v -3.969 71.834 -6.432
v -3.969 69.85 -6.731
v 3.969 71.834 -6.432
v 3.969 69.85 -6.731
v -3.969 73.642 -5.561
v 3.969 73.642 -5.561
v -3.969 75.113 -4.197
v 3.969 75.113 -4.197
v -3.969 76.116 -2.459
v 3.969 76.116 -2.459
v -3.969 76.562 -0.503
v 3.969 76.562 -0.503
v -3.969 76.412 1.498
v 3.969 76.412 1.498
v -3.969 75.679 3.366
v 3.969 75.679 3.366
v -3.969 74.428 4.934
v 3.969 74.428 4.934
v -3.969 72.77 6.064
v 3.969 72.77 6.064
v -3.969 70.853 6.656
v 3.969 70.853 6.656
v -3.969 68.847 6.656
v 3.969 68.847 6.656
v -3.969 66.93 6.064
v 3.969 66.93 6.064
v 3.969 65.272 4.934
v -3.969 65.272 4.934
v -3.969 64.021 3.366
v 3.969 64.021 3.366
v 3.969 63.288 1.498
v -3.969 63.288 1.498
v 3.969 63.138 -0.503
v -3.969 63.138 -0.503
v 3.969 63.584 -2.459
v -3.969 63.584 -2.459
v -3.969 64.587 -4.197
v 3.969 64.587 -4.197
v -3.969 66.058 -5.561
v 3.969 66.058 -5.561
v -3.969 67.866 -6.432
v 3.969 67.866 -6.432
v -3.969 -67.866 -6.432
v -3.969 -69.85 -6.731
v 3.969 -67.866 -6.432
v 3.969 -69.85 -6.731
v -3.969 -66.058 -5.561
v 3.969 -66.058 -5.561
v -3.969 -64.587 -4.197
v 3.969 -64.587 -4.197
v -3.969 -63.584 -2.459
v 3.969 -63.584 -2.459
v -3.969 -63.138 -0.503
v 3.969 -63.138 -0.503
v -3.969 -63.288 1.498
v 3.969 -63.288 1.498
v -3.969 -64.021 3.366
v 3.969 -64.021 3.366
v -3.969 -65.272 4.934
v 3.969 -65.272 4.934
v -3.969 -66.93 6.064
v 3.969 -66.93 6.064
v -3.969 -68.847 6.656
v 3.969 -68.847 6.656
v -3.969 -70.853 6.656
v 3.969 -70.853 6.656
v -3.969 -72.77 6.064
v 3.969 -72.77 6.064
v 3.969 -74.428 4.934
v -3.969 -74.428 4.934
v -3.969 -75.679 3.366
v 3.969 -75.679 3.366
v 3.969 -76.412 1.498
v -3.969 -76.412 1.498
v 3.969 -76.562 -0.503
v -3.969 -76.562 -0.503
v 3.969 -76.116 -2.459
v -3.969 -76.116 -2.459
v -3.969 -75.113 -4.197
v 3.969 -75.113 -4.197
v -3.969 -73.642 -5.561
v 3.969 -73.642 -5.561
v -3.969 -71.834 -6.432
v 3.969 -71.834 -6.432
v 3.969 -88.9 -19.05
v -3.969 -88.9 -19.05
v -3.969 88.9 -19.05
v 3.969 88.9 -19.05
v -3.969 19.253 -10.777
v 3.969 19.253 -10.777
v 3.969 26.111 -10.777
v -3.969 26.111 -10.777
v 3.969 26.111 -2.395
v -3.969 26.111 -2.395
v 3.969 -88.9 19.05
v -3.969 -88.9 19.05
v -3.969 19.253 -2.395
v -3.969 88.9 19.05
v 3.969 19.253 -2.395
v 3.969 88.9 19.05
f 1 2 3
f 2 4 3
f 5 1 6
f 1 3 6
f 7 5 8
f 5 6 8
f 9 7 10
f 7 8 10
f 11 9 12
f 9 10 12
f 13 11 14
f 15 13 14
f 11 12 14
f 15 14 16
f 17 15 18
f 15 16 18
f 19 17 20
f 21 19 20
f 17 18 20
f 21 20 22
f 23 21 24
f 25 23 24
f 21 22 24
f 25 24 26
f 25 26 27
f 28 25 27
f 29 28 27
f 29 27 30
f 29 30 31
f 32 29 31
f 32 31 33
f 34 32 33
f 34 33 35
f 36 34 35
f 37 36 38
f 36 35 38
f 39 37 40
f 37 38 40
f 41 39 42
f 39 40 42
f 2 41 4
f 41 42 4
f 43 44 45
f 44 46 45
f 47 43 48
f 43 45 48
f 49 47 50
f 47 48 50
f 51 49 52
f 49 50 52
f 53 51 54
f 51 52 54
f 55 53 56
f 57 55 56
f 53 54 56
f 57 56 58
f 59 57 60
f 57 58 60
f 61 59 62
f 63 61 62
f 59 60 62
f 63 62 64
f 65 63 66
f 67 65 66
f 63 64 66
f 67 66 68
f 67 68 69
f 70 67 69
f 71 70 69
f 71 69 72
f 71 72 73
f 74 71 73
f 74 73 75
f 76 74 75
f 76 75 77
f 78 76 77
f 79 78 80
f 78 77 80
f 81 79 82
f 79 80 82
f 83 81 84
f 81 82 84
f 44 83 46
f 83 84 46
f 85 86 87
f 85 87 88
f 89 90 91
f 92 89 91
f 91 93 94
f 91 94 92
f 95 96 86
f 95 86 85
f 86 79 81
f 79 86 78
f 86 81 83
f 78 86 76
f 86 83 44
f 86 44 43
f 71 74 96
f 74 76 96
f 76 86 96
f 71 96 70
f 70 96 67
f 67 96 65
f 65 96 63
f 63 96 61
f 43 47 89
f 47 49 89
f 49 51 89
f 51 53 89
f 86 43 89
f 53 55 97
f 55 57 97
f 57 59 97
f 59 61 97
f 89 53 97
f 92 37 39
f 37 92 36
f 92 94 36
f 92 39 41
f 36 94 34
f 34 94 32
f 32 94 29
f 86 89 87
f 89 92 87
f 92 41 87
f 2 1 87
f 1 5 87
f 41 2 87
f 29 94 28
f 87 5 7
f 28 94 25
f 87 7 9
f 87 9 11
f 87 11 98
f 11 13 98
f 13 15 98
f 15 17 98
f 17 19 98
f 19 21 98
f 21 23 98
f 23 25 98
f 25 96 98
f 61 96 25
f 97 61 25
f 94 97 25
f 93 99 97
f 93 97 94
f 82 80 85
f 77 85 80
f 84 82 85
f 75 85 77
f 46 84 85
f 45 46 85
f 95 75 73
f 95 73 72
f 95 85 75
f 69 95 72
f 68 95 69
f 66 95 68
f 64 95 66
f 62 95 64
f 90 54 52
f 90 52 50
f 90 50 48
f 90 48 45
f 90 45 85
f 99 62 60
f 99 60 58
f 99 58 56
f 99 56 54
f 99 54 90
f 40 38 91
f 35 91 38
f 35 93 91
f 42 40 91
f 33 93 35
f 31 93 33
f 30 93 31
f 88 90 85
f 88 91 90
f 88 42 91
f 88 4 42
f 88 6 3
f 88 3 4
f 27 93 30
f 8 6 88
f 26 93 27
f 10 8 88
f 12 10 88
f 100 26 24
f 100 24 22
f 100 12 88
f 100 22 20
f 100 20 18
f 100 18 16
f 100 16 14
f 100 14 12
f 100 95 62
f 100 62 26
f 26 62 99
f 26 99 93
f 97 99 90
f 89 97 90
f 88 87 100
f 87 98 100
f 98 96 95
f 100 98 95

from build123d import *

# Parameters (mm, degrees)
SKETCH1_W               = 7.9375
SKETCH1_H               = 177.8
EXTRUDE_THIN1_DEPTH     = 19.05
SKETCH2_R               = 6.731
CUT_EXTRUDE1_DEPTH      = 4.96875
CUT_EXTRUDE1_DEPTH_BACK = 5.08
SKETCH3_W               = 8.382
SKETCH3_H               = 6.858
CUT_EXTRUDE2_DEPTH      = 4.96875
CUT_EXTRUDE2_DEPTH_BACK = 4.96875


with BuildPart() as part:
    # Sketch1 → Extrude-Thin1 (new body, symmetric)
    with BuildSketch(Plane.XY):
        Rectangle(SKETCH1_W, SKETCH1_H)
    extrude(amount=EXTRUDE_THIN1_DEPTH, both=True)

    # Sketch2 → Cut-Extrude1 (cut, two sides)
    with BuildSketch(Plane(origin=(0, 0, 0), x_dir=(0, 0, -1), z_dir=(1, 0, 0))) as cut_extrude1_sk:
        with Locations((0, 69.85)):
            Circle(SKETCH2_R)
        with Locations((0, -69.85)):
            Circle(SKETCH2_R)
    extrude(amount=CUT_EXTRUDE1_DEPTH, mode=Mode.SUBTRACT)
    extrude(cut_extrude1_sk.sketch, amount=-CUT_EXTRUDE1_DEPTH_BACK, mode=Mode.SUBTRACT)

    # Sketch3 → Cut-Extrude2 (cut, two sides)
    with BuildSketch(Plane(origin=(0, 0, 0), x_dir=(0, 0, -1), z_dir=(1, 0, 0))) as cut_extrude2_sk:
        with Locations((6.58622, 22.6822)):
            Rectangle(SKETCH3_W, SKETCH3_H)
    extrude(amount=CUT_EXTRUDE2_DEPTH, mode=Mode.SUBTRACT)
    extrude(cut_extrude2_sk.sketch, amount=-CUT_EXTRUDE2_DEPTH_BACK, mode=Mode.SUBTRACT)


solid = part.part
